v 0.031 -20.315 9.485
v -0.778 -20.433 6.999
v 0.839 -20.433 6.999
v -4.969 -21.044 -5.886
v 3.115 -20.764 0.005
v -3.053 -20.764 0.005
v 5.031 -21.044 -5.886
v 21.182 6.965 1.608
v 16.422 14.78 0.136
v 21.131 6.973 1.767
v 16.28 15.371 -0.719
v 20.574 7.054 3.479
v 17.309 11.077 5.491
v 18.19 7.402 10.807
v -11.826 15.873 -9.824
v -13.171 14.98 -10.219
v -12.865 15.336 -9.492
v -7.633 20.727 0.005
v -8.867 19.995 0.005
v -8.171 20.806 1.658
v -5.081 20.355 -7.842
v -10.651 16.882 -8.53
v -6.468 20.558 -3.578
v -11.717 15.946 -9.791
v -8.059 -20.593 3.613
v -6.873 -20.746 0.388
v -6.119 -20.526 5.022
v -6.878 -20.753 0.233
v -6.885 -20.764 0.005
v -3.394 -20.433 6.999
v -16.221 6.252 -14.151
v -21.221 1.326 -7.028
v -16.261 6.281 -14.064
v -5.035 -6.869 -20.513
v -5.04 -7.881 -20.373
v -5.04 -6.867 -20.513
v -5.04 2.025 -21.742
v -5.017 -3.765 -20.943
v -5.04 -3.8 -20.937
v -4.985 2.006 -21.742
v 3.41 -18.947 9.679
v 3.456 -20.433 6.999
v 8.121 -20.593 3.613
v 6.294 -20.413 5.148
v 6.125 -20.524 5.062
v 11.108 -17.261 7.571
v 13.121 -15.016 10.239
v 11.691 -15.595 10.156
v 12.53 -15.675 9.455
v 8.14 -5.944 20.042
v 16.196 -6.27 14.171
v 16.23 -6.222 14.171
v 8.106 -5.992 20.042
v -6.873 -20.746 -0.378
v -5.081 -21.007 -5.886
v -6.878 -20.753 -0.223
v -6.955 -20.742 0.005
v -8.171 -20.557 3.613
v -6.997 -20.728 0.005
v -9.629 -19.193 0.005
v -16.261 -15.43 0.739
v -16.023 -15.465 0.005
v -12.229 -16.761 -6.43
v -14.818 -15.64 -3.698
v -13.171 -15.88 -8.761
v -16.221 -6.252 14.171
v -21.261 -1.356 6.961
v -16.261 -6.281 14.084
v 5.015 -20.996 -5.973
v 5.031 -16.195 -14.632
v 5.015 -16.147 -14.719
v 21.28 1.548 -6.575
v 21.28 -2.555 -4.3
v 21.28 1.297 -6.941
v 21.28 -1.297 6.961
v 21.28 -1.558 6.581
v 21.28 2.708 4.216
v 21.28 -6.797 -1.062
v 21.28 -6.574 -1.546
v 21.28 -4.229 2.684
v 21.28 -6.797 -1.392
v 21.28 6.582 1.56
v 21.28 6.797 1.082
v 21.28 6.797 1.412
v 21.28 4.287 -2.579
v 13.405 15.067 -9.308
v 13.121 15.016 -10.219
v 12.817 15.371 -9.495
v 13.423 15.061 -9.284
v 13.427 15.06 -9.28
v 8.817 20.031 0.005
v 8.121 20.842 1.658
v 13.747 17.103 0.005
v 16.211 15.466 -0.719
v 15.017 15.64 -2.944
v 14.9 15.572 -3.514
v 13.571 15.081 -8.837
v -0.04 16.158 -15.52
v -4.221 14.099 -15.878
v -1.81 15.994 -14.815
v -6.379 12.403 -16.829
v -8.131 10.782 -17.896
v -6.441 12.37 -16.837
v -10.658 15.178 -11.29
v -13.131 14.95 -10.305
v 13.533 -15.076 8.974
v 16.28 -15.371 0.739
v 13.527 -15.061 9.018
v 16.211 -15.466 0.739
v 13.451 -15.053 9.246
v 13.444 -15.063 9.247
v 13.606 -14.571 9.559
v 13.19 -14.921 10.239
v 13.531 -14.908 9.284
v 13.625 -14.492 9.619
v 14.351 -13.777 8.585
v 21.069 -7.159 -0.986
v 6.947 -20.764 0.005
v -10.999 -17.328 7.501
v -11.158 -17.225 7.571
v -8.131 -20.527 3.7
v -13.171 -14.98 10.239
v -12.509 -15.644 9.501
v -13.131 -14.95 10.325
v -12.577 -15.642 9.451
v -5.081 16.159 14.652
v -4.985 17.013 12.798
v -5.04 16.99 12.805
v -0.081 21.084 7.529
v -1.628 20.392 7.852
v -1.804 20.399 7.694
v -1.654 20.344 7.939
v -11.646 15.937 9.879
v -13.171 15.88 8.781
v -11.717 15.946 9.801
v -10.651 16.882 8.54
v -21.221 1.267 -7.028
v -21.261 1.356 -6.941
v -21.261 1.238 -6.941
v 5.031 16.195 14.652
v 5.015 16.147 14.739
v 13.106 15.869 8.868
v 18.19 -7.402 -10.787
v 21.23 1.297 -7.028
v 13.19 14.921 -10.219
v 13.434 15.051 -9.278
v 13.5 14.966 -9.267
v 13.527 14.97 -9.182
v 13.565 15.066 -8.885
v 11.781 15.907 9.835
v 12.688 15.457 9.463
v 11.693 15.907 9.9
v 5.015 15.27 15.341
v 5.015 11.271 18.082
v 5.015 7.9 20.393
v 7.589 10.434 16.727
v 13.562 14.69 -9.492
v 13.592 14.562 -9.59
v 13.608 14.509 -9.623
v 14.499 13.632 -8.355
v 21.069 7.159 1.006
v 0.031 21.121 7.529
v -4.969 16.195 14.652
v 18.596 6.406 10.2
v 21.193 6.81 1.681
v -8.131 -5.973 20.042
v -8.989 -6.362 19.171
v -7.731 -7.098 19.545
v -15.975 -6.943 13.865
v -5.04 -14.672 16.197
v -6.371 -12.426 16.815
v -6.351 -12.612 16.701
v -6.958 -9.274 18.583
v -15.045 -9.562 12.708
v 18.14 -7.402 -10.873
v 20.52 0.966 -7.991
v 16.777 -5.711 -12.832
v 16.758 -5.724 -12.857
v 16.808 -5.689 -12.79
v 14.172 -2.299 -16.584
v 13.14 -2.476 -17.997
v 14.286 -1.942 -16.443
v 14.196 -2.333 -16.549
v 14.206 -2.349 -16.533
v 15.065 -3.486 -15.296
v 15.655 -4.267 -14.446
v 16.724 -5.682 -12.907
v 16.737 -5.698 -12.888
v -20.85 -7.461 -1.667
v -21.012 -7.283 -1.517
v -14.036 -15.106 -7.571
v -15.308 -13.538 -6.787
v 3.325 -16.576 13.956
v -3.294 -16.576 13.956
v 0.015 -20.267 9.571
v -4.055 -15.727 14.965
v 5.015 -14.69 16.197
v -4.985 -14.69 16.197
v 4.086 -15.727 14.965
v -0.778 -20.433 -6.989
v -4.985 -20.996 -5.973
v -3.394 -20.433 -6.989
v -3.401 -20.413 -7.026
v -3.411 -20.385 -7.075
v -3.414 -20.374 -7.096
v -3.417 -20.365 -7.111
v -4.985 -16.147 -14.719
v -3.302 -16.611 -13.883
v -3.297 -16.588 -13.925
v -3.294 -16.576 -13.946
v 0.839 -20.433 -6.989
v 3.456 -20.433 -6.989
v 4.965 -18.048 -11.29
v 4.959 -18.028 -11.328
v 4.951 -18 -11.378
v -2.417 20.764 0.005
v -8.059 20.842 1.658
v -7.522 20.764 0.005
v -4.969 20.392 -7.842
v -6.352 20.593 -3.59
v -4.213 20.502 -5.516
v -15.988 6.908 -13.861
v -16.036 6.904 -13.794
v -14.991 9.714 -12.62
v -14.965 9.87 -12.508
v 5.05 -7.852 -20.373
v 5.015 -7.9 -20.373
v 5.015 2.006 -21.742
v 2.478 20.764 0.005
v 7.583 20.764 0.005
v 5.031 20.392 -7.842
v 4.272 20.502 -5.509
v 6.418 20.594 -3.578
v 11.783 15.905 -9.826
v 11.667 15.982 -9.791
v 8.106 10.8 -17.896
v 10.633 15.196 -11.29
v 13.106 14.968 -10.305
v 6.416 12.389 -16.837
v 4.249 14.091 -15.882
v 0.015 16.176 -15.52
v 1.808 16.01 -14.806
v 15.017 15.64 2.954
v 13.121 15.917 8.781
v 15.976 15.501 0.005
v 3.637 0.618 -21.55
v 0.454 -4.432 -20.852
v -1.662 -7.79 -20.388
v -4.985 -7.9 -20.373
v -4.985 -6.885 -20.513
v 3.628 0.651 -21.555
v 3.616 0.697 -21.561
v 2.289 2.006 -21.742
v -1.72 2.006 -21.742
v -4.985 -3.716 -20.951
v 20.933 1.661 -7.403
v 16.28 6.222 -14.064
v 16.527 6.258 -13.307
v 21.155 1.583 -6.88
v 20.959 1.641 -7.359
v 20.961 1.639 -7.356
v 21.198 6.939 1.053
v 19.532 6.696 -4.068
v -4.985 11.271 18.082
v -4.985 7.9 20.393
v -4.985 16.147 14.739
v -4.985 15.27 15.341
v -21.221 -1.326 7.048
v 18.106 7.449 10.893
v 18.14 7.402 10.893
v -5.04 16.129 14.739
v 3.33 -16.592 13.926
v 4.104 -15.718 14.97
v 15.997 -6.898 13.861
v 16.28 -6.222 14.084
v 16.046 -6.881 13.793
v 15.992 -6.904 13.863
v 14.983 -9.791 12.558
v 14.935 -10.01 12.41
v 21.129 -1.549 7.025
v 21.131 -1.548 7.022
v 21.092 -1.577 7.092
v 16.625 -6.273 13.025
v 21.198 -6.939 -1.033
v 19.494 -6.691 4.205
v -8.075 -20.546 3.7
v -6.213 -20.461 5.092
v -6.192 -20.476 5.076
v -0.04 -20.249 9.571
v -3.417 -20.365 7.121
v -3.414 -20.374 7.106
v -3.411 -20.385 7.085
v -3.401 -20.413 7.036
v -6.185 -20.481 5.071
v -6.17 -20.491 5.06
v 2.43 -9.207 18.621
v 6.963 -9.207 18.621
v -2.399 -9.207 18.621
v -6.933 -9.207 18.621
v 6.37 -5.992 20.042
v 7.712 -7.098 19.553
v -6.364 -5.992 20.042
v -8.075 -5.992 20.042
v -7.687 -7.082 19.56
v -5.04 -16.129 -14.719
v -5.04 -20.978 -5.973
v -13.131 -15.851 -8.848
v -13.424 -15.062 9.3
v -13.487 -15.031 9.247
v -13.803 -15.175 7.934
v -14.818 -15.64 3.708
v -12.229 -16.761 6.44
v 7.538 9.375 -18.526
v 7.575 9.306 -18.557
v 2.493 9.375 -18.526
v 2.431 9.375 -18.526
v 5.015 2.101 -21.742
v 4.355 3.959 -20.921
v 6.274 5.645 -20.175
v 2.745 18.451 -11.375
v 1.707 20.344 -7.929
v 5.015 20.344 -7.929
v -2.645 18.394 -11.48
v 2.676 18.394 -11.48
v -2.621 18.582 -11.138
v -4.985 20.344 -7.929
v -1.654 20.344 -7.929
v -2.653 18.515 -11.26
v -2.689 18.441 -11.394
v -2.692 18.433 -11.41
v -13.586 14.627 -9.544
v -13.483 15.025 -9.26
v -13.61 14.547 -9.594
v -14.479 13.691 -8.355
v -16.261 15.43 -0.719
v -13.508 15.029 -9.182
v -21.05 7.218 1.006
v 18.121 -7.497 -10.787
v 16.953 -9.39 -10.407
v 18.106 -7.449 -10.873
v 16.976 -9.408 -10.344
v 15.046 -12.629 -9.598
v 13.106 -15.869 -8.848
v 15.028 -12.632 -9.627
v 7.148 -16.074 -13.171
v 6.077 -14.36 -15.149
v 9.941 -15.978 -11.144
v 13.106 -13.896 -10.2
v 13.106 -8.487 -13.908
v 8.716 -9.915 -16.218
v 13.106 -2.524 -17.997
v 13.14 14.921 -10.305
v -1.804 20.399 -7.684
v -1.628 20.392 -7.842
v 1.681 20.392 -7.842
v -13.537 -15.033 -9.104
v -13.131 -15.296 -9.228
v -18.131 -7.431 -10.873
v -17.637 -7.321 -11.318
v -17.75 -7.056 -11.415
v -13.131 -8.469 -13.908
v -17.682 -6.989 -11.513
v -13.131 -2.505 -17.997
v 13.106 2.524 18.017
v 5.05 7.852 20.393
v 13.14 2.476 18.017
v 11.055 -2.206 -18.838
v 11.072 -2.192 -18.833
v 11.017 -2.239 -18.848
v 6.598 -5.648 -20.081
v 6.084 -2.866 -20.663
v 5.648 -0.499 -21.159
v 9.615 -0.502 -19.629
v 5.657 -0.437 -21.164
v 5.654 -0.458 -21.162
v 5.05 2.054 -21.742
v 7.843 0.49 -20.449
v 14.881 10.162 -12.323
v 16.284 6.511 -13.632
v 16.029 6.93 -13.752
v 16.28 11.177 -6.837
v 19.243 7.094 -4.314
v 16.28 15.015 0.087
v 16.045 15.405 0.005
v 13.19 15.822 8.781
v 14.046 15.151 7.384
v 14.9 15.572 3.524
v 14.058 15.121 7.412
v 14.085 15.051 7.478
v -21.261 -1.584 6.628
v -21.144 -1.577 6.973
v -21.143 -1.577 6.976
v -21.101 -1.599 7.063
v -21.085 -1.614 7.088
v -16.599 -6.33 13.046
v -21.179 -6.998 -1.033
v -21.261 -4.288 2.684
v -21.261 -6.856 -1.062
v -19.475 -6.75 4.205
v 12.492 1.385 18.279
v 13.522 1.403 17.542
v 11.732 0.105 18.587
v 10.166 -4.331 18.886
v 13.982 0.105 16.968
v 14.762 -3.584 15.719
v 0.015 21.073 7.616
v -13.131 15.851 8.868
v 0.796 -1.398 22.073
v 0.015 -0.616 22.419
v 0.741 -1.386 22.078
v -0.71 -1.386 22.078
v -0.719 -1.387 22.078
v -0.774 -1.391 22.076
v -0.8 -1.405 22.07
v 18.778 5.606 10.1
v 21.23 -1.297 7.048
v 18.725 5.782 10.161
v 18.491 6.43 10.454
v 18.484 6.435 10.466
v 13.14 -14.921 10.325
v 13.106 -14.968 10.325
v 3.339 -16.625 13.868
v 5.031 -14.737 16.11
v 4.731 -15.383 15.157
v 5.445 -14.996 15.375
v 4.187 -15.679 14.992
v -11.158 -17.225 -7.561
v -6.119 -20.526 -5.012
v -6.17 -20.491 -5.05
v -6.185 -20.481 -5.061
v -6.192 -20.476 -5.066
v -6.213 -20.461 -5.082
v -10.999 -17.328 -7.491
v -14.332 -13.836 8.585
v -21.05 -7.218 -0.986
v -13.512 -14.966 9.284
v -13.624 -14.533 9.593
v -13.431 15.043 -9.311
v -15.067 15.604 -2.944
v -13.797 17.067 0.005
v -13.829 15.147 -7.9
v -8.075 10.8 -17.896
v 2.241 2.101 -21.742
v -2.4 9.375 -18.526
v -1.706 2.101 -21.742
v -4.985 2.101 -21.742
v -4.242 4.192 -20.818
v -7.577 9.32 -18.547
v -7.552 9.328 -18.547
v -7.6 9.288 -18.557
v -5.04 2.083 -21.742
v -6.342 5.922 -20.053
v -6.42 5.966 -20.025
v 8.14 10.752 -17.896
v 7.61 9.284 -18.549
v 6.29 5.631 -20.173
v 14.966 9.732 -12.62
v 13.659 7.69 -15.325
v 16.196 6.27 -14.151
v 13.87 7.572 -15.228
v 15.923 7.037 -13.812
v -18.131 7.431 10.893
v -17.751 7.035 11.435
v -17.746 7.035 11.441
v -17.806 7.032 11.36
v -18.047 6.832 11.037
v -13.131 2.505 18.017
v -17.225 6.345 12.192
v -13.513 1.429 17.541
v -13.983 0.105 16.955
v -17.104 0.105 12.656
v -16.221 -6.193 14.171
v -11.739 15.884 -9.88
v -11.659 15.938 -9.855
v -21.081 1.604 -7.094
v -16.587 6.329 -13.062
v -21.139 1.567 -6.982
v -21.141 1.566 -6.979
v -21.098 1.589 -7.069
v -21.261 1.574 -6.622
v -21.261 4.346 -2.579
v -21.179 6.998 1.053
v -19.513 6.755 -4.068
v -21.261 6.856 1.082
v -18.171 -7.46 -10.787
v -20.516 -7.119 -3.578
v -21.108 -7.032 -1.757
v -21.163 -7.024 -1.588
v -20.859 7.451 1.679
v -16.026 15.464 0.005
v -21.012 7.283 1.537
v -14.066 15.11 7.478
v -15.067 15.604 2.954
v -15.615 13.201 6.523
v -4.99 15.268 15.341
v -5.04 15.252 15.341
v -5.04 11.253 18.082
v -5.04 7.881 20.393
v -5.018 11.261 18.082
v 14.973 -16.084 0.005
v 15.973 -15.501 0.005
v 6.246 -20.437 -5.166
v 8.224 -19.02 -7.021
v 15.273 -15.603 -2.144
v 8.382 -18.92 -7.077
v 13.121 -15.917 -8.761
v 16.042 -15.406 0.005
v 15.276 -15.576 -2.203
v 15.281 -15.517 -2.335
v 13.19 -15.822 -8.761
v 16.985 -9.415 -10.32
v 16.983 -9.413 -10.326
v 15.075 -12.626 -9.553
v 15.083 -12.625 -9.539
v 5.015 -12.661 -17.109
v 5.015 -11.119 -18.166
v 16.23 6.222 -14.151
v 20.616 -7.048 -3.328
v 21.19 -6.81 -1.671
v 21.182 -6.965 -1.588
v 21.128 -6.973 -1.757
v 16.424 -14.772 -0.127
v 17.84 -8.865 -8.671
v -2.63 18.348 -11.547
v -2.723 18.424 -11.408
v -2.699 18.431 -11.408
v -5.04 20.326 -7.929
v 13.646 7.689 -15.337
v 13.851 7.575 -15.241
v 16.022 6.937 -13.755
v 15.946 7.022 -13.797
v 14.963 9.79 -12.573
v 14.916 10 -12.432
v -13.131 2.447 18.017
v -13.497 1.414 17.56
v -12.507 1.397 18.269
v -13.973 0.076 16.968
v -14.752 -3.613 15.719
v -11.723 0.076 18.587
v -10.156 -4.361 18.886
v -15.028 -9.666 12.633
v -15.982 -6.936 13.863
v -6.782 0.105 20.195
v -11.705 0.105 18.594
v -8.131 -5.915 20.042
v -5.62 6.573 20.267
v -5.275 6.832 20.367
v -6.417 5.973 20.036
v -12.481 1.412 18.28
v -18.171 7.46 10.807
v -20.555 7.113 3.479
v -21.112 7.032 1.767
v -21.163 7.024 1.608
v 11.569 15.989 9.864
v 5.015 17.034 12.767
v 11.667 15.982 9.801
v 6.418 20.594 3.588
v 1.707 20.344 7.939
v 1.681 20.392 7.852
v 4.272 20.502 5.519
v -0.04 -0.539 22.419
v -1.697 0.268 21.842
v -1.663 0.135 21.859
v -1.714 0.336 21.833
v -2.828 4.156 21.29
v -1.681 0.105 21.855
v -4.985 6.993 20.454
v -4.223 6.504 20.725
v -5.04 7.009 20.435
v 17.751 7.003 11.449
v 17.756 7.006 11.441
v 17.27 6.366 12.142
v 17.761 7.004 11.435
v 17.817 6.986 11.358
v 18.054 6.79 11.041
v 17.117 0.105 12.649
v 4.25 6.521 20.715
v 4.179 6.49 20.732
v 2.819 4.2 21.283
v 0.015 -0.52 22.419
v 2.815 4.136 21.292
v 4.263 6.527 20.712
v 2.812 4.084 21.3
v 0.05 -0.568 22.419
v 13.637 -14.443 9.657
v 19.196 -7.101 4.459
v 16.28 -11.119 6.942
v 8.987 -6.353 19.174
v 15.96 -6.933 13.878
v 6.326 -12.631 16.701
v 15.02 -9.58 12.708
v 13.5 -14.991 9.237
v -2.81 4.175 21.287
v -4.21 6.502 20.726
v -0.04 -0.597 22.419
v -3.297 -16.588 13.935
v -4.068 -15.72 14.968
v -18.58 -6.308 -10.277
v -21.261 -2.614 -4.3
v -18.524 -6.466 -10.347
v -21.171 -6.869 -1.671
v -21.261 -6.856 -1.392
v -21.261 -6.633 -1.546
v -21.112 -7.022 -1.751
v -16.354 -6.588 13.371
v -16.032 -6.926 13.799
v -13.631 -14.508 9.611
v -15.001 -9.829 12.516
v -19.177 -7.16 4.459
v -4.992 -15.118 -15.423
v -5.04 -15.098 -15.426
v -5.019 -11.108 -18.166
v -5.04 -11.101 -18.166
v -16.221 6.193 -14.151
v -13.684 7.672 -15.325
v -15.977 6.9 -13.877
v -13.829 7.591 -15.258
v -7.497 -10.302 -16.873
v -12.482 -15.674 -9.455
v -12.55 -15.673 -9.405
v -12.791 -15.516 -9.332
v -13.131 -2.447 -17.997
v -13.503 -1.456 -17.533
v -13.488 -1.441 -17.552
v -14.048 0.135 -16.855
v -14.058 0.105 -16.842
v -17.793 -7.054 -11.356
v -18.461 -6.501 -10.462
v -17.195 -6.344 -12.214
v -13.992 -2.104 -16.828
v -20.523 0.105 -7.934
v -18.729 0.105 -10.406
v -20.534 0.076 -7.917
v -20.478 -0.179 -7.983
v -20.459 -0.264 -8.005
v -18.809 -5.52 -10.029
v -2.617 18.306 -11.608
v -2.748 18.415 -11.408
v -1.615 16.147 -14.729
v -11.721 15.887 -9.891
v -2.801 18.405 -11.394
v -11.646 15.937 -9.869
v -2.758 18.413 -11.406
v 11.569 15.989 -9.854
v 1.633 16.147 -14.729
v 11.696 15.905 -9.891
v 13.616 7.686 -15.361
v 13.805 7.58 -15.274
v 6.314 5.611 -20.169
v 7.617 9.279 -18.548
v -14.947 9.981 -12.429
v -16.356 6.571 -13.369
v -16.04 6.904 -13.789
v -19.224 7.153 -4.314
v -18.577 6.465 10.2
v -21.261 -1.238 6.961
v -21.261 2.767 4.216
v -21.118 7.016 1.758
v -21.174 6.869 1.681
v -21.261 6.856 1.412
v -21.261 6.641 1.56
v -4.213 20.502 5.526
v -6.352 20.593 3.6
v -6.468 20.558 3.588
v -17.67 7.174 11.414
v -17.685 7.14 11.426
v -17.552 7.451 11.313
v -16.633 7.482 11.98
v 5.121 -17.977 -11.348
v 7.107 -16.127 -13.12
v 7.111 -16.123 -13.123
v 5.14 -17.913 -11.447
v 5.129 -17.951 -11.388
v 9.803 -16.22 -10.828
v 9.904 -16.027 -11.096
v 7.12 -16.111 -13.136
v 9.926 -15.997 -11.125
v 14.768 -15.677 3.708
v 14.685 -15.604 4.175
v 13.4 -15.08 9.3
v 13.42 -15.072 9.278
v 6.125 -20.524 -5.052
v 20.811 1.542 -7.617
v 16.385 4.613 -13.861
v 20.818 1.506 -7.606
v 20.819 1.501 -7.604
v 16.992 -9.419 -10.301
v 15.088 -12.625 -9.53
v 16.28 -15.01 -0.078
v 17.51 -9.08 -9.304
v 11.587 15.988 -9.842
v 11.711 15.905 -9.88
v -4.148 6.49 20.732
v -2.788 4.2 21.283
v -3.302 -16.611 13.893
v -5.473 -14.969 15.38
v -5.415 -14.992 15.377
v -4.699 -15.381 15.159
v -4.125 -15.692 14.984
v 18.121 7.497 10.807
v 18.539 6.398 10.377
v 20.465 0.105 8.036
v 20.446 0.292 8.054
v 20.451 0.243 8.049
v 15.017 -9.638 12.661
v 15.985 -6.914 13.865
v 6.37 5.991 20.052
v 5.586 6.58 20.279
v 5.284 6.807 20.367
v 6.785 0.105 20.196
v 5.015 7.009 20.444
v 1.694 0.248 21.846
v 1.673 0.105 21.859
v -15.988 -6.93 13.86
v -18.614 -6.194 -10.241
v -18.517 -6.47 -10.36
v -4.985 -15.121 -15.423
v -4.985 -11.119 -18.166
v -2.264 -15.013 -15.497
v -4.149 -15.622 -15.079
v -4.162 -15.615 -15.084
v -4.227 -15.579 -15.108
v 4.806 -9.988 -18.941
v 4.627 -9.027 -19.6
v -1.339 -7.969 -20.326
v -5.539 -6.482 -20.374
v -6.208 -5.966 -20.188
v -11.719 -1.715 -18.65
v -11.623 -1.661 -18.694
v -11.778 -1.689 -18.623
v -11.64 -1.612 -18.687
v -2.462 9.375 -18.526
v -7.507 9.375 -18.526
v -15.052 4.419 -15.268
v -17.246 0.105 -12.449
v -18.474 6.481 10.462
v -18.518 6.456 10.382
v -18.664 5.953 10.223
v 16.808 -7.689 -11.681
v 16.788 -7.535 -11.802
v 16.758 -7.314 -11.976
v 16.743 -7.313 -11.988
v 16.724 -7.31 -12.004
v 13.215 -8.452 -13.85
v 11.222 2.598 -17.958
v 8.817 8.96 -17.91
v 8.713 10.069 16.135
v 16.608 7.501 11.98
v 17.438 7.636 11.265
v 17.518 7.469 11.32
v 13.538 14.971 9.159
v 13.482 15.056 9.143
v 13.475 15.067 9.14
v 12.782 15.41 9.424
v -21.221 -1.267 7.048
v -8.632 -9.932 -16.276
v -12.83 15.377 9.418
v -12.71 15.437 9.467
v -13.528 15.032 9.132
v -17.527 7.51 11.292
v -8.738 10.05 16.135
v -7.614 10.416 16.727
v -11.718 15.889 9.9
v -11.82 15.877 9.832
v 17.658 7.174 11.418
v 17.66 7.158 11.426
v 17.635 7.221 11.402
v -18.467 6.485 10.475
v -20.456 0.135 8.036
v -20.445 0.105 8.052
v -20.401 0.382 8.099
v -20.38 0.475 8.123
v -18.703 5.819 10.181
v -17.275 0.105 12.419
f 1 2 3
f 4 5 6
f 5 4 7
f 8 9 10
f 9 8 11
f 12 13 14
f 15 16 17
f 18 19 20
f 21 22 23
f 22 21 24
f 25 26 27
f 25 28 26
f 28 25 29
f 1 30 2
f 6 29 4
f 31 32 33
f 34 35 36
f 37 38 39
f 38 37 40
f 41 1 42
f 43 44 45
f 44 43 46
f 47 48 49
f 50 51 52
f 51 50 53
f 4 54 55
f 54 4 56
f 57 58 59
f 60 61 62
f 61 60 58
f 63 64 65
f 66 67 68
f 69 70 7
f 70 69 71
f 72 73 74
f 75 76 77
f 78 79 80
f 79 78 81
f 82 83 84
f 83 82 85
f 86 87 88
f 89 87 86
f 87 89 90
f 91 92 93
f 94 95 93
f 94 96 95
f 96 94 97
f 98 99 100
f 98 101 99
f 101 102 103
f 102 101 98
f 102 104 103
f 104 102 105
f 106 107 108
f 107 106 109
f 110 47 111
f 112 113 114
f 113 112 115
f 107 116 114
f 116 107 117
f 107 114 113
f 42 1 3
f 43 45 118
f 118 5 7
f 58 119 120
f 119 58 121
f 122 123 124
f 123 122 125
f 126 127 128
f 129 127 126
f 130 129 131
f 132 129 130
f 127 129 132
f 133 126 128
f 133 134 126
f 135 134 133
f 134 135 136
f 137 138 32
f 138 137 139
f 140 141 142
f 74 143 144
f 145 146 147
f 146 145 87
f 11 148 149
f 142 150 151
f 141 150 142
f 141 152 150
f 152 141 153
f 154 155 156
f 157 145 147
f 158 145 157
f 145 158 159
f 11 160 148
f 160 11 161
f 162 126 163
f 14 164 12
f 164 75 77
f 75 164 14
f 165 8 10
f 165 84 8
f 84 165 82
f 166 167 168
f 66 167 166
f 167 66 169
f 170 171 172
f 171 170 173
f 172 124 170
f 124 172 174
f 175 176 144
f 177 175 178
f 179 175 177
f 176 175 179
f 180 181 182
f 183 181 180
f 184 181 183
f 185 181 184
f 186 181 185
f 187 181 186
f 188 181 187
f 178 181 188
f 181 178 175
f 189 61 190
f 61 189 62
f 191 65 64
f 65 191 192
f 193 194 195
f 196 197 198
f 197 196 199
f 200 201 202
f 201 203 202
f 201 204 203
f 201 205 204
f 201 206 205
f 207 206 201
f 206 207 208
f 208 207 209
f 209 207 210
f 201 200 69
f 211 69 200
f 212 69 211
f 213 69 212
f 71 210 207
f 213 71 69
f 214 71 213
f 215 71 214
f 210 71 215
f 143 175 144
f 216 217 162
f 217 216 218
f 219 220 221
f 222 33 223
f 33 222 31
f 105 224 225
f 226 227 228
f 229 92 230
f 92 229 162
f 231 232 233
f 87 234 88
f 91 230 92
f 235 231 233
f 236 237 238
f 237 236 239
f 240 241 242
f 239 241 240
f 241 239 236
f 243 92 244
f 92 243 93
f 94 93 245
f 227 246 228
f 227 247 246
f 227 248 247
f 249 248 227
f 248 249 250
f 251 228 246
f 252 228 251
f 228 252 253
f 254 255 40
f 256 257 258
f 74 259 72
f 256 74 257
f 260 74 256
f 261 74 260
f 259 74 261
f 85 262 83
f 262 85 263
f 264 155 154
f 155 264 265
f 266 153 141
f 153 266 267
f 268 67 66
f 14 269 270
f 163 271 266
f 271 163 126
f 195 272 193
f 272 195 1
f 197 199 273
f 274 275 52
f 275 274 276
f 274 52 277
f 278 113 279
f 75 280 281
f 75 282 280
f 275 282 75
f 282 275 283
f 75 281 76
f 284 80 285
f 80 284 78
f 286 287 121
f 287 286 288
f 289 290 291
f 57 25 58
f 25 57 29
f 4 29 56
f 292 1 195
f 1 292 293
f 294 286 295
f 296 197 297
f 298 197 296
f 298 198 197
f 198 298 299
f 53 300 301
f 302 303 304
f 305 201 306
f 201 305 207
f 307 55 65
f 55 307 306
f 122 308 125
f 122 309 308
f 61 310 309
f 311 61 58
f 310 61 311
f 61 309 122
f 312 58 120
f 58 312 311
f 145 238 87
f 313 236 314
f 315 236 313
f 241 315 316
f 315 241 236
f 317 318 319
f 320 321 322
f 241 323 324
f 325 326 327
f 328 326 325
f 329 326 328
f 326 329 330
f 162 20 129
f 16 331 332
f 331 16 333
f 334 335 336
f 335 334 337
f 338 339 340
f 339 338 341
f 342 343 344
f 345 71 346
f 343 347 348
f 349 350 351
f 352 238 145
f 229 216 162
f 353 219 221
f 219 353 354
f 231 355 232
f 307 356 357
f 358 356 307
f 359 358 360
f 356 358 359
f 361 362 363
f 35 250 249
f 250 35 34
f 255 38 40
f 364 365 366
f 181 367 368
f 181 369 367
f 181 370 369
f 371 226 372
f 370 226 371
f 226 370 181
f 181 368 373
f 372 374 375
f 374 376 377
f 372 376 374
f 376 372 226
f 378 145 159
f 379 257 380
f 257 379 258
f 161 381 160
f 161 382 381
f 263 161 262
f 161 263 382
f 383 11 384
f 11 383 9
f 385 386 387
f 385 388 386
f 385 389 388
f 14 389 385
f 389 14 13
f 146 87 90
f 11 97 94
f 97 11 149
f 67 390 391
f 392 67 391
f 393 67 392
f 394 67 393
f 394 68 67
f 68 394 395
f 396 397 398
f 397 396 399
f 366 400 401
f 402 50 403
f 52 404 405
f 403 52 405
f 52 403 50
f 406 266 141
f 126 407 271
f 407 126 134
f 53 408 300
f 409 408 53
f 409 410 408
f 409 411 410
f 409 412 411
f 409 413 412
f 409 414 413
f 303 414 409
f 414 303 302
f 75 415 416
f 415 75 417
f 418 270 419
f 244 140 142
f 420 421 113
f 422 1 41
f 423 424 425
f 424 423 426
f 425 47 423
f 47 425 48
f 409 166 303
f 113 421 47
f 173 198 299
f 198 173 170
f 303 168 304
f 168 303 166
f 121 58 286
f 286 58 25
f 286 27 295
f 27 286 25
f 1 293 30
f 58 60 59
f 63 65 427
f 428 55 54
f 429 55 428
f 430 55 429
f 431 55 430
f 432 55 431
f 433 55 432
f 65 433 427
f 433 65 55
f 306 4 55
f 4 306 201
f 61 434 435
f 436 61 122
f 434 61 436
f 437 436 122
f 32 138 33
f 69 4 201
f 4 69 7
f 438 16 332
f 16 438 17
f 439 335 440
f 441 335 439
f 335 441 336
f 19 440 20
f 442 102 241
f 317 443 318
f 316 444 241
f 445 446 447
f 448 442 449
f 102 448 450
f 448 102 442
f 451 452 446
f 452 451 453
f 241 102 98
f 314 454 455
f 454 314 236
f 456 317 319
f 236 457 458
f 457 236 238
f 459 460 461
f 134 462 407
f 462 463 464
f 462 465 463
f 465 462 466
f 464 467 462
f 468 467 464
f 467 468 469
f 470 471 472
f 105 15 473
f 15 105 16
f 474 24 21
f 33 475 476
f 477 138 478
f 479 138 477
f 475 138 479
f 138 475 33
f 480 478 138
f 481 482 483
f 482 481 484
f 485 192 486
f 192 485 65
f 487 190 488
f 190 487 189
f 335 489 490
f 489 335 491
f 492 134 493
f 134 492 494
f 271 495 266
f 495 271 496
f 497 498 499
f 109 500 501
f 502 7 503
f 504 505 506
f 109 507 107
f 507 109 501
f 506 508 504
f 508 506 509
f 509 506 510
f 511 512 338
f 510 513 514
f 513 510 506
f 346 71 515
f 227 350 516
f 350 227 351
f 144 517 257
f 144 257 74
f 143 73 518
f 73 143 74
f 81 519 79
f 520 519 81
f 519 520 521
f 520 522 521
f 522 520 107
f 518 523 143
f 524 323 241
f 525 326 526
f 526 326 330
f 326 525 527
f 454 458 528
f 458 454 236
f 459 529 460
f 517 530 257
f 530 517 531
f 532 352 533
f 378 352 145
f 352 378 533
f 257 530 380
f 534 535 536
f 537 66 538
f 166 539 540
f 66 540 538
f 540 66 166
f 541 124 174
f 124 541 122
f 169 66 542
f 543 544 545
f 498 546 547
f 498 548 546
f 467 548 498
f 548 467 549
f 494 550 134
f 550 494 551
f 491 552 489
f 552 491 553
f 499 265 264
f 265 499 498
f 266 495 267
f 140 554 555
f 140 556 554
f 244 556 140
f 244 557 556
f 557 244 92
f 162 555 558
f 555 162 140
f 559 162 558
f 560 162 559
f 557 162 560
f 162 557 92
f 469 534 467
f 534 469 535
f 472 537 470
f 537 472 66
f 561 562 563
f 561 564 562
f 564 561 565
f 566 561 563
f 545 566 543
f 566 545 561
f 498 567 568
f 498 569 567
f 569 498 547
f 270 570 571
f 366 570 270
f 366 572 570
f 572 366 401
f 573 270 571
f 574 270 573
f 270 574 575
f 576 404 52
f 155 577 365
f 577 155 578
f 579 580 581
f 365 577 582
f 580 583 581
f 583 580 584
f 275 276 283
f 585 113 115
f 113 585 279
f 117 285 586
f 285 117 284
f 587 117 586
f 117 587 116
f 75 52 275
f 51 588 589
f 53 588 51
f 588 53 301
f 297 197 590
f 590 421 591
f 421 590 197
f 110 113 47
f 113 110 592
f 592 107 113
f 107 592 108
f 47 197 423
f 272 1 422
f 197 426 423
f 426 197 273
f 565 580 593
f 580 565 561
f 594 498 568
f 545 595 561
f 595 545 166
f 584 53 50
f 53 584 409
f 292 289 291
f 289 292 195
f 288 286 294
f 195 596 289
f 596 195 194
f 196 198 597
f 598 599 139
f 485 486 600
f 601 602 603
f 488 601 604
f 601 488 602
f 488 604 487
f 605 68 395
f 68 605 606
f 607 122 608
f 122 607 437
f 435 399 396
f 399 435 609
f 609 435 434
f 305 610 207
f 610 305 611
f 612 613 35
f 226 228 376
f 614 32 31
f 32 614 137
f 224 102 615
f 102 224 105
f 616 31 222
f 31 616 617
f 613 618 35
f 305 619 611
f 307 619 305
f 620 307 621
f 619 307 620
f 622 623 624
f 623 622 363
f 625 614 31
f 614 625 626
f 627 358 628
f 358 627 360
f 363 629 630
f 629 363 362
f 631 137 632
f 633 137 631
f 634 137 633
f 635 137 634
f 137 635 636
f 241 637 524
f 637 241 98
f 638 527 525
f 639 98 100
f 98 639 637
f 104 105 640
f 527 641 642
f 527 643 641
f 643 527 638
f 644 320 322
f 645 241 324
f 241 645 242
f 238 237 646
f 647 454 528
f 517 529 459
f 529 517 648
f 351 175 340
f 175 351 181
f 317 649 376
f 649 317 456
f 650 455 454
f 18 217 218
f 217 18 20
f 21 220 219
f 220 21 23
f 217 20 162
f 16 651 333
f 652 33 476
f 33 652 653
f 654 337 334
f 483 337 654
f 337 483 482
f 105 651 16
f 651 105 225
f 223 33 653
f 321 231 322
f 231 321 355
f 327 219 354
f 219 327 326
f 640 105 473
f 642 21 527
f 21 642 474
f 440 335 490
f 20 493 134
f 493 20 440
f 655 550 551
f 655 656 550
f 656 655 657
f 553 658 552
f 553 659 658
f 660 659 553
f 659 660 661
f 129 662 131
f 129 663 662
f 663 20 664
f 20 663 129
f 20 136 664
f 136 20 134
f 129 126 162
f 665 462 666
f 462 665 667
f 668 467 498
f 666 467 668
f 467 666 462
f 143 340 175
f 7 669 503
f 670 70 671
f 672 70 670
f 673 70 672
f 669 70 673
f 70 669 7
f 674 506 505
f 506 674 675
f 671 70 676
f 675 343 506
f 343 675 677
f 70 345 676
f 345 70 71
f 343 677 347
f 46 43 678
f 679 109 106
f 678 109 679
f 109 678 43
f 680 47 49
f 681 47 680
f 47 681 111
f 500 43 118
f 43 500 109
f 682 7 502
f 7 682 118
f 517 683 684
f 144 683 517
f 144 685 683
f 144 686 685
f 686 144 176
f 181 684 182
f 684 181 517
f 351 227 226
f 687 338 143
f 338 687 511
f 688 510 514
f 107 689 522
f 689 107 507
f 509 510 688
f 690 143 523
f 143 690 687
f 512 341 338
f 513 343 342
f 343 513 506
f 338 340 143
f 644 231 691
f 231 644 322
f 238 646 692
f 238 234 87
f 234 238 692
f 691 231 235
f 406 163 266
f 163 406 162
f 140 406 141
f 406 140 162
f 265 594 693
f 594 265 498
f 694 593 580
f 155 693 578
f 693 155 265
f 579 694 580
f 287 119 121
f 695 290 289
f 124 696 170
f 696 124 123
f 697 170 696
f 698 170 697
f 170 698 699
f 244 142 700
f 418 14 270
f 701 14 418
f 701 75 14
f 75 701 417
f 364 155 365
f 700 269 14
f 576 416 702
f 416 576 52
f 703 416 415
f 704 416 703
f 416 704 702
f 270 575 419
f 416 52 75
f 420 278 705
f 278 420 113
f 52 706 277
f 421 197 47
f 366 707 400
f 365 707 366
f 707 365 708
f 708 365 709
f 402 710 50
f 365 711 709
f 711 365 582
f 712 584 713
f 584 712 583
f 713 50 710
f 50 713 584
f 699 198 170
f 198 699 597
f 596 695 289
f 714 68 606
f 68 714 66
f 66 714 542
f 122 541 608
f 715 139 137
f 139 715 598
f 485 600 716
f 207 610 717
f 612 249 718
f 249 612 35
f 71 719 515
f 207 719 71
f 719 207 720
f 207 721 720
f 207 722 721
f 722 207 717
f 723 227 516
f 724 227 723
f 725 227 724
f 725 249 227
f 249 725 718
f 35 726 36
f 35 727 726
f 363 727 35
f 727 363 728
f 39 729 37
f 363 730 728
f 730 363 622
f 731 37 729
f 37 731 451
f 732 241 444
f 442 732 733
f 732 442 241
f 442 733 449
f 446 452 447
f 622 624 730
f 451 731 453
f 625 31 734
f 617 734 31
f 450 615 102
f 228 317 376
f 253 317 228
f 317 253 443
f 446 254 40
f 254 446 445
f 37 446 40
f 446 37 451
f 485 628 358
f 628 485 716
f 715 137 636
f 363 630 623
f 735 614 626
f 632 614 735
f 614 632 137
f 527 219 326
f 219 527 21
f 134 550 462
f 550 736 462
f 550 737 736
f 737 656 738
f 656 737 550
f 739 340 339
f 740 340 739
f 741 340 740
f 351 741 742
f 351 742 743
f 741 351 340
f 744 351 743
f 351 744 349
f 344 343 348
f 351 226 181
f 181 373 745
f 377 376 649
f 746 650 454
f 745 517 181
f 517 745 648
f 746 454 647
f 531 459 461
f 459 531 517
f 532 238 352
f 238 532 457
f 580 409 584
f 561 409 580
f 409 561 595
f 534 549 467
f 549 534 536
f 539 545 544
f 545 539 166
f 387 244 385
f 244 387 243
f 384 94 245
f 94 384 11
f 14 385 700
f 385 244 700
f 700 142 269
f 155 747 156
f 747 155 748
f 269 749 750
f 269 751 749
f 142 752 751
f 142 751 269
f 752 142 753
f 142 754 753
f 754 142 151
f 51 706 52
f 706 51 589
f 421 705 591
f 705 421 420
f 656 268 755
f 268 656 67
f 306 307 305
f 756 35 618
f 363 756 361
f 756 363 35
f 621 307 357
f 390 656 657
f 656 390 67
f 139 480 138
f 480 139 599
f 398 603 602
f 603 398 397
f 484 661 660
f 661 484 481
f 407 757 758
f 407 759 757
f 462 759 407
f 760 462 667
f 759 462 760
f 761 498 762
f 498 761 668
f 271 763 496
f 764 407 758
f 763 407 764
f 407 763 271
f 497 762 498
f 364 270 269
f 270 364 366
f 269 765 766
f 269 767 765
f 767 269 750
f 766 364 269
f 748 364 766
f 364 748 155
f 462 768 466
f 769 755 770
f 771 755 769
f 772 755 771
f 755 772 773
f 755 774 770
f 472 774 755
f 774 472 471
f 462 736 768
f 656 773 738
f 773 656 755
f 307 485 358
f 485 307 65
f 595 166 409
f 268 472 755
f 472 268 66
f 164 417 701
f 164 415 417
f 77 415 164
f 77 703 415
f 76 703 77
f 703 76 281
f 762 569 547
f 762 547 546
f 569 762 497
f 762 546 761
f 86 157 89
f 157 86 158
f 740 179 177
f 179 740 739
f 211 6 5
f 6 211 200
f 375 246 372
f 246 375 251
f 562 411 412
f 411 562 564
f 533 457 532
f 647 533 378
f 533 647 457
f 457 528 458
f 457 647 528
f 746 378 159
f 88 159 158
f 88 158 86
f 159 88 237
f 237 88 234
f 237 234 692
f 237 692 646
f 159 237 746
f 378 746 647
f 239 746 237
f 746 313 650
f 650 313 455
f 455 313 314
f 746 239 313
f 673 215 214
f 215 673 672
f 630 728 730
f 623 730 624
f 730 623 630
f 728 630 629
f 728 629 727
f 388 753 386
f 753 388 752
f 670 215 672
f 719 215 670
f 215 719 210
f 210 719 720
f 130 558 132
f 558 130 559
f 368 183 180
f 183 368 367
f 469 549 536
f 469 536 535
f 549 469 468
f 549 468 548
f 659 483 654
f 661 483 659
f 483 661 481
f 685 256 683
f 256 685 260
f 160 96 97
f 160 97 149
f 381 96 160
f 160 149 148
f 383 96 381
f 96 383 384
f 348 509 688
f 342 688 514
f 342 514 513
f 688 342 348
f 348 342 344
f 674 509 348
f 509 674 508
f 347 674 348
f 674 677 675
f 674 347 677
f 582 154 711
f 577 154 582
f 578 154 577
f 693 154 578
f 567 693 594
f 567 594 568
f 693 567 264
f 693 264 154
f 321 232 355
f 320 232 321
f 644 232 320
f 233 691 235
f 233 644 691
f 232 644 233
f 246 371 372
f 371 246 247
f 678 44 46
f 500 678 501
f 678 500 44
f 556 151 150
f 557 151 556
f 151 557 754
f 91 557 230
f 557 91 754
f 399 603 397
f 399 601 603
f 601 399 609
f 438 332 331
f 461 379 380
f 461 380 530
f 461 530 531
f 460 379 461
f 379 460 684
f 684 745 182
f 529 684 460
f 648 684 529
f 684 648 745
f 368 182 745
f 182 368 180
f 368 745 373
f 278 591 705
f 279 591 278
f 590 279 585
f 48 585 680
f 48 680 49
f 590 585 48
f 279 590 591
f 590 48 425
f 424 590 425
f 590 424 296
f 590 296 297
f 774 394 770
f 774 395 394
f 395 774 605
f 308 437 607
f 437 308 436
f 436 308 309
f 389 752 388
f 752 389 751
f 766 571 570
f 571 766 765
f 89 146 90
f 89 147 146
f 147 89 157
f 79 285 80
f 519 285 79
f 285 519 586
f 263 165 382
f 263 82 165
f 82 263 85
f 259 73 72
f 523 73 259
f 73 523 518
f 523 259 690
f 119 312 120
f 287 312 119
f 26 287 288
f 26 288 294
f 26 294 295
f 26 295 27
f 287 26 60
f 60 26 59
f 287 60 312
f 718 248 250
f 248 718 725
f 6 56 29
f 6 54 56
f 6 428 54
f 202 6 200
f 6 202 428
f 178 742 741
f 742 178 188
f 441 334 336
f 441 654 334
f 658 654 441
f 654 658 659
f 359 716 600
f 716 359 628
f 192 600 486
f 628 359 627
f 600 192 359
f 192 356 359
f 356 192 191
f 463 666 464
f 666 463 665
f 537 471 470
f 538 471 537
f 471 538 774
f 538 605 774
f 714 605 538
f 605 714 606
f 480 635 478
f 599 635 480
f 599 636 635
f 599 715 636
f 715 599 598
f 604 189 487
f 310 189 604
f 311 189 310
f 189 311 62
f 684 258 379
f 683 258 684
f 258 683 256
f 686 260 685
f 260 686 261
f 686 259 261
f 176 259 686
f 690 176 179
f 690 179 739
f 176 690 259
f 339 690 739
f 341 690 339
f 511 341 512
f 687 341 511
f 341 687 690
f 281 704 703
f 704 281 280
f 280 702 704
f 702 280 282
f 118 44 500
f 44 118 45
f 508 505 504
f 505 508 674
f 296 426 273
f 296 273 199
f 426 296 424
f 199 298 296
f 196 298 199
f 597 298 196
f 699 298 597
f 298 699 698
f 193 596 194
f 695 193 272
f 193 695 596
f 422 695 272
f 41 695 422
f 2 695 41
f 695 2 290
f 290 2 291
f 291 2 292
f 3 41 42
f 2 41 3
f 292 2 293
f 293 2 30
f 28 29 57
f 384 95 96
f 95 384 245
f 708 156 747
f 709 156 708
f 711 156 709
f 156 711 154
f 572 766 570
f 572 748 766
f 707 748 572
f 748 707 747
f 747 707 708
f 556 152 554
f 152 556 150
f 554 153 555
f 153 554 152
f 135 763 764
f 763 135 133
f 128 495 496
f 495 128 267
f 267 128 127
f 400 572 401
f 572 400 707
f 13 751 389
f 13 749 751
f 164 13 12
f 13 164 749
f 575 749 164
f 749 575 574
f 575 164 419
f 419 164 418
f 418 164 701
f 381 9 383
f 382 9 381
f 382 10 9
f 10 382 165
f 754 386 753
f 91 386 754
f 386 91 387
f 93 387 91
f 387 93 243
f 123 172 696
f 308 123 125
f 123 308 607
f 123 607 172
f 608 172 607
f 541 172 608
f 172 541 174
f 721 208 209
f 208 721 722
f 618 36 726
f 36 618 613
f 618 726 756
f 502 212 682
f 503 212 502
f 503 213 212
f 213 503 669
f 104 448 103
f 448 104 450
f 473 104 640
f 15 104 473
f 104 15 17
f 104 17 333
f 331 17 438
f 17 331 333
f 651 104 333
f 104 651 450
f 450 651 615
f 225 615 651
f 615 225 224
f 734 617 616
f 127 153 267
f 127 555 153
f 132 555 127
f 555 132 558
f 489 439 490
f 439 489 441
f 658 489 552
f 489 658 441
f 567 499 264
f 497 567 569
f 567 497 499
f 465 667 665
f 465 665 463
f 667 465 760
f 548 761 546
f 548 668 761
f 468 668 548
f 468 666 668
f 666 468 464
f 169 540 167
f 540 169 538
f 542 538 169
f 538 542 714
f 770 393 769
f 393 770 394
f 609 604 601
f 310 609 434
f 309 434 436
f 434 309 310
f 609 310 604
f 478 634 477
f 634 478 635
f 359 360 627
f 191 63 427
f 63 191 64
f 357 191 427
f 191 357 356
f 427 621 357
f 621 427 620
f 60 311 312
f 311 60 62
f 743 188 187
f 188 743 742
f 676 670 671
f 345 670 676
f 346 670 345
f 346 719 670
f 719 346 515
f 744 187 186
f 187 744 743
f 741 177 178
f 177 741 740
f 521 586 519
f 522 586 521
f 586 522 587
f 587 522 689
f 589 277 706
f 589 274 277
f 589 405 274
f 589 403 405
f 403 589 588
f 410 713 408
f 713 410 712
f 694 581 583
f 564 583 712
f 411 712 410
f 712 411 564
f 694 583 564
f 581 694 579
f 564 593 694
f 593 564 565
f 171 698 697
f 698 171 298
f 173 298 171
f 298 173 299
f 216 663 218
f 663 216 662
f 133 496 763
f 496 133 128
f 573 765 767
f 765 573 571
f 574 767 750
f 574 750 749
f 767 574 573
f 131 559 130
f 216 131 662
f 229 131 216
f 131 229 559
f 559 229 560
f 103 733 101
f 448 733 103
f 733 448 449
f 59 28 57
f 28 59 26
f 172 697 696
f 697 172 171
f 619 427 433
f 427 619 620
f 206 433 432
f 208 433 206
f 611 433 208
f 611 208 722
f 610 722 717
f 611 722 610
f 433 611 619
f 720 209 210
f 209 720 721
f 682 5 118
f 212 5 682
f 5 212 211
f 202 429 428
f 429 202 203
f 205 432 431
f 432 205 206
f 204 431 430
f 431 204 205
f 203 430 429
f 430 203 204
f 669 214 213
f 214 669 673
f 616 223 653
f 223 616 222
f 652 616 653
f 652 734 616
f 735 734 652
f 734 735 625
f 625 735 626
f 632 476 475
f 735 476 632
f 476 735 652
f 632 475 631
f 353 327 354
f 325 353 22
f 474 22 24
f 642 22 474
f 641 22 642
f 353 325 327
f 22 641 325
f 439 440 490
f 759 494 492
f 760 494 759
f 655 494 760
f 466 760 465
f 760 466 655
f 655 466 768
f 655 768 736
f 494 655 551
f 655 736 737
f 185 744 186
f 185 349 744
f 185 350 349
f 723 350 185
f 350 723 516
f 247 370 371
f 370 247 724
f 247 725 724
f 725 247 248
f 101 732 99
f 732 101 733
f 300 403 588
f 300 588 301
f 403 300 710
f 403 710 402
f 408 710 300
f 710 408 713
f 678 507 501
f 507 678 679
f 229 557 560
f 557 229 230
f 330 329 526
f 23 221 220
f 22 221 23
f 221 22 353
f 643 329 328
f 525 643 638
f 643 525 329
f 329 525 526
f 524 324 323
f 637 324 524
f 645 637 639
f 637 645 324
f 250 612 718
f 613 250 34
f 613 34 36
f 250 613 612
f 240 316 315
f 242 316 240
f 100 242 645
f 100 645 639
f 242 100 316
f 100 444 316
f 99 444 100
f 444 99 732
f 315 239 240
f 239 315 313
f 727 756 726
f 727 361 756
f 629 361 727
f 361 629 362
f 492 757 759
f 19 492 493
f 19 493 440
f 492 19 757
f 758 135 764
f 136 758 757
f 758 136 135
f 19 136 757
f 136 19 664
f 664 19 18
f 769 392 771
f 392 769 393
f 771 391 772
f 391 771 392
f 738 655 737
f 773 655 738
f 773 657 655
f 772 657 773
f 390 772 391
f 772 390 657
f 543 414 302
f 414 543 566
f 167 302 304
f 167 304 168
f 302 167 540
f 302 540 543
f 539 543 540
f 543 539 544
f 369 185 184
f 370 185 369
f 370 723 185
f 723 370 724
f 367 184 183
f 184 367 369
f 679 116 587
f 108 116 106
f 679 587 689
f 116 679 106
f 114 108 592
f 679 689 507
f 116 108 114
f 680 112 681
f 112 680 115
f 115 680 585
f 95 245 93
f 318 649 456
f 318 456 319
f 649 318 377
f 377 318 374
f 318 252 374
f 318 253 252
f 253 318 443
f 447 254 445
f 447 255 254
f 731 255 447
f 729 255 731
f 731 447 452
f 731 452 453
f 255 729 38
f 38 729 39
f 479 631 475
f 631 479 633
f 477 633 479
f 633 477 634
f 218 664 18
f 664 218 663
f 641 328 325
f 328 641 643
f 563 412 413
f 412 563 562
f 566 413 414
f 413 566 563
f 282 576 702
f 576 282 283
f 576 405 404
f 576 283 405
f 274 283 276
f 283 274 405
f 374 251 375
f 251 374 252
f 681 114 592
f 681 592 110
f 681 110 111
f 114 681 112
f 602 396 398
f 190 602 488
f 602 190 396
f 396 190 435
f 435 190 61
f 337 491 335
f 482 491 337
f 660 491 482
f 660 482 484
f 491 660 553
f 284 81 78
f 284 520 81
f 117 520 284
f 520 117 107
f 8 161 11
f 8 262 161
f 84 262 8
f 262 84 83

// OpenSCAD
// Auto-generated OpenSCAD file
    shift = 0.01;

    inner_points = 10*[[0.5000000000001233, 1.6099947582269307, -1.4642352461204697], [-1.6180339887500594, -0.7526043623065494, 1.3422446358941107], [0.8090169943752056, 0.7804419520270026, -1.929370322107236], [-1.3090169943749772, -1.5821571685064775, 0.8771095599073444], [1.3090169943749772, 1.5821571685064775, -0.8771095599073444], [-0.8090169943752056, -0.7804419520270026, 1.929370322107236], [1.6180339887500594, 0.7526043623065494, -1.3422446358941107], [-0.5000000000001233, -1.6099947582269307, 1.4642352461204697], [-1.6180339887497301, 0.752604362306319, -1.342244635894637], [-2.118033988749798, 0.1948703662791984, -0.6797246062536065], [-1.309016994374648, -0.07694844389360919, -1.8073797118814032], [-1.8090169943747159, -0.6346824399207297, -1.144859682240373], [1.8090169943747159, 0.6346824399207297, 1.144859682240373], [1.309016994374648, 0.07694844389360919, 1.8073797118814032], [2.118033988749798, -0.1948703662791984, 0.6797246062536065], [1.6180339887497301, -0.752604362306319, 1.342244635894637], [-2.7630675525358583e-14, 2.1025431187665826, -0.7519178221235898], [-1.30901699437522, 1.4920728358409685, 1.0228690720136886], [0.8618033988753376, -0.21095885990434457, -2.0491118170111076], [2.9809488211185453e-13, -2.021969242147636, -0.9474747285857835], [0.8090169943748263, 2.0747055290461294, -0.1647921359104645], [-0.500000000000366, 1.4642352461205153, 1.609994758226814], [1.6708203932501915, -0.2387964496247978, -1.4619861307979825], [0.8090169943751521, -2.0498068318680893, -0.3603490423726582], [-0.5000000000002721, 2.0296633627133747, 0.7851971800500518], [-1.309016994375247, 0.07694844389342262, 1.8073797118809776], [0.8618033988753109, -1.6260832518518904, -1.264601177143819], [-0.49999999999994665, -2.094848998200844, 0.5896402735878584], [-0.8090169943746892, 0.7804419520268874, -1.9293703221074994], [-2.118033988749815, -0.6797246062534129, -0.19487036627969367], [2.118033988749815, 0.6797246062534129, 0.19487036627969367], [0.8090169943746892, -0.7804419520268874, 1.9293703221074994], [-1.6180339887500161, 1.5371150021736077, 0.07287975605290908], [-0.49999999999963374, -1.4642352461205865, -1.6099947582269767], [0.49999999999963374, 1.4642352461205865, 1.6099947582269767], [1.6180339887500161, -1.5371150021736077, -0.07287975605290908], [-0.49999999999987643, 1.6099947582268597, -1.4642352461206323], [-2.1180339887499917, -0.19487036627950022, 0.6797246062529179], [3.4166940110491595e-13, 0.26775012233252143, -2.2168396084269855], [-1.6180339887497732, -1.5371150021738385, -0.07287975605343533], [1.6180339887497732, 1.5371150021738385, 0.07287975605343533], [-3.4166940110491595e-13, -0.26775012233252143, 2.2168396084269855], [2.1180339887499917, 0.19487036627950022, -0.6797246062529179], [0.49999999999987643, -1.6099947582268597, 1.4642352461206323], [-1.3090169943749175, 1.5821571685062912, -0.8771095599077703], [-2.118033988749975, 0.6797246062531112, 0.1948703662790049], [-0.4999999999996173, -0.5896402735879751, -2.0948489982008898], [-1.3090169943746748, -1.4920728358411552, -1.0228690720141145], [1.3090169943746748, 1.4920728358411552, 1.0228690720141145], [0.4999999999996173, 0.5896402735879751, 2.0948489982008898], [2.118033988749975, -0.6797246062531112, -0.1948703662790049], [1.3090169943749175, -1.5821571685062912, 0.8771095599077703], [-0.8090169943750684, 2.074705529046014, -0.1647921359107279], [-1.8090169943751788, 0.634682439920472, 1.1448596822397847], [0.36180339887537877, -1.068349255824841, -1.9271212067850119], [-0.8090169943747427, -2.0498068318682043, -0.3603490423729214], [0.4999999999997277, 2.029663362713446, 0.7851971800502144], [-0.5000000000003827, 0.5896402735879039, 2.0948489982007272], [1.6708203932501748, -1.1133914221574093, -0.9771318908240696], [0.5000000000000535, -2.0948489982007725, 0.589640273588021]];

    outer_points_unshifted = 10*[[-0.5000000000005009, -0.7851971800501374, -2.0296633627132854], [-0.4999999999996386, 1.6099947582268983, 1.4642352461206711], [-0.5000000000003614, -1.6099947582268983, -1.4642352461204242], [-0.4999999999994991, 0.7851971800501374, 2.0296633627135323], [0.4999999999994991, -0.7851971800501374, -2.0296633627135323], [0.5000000000003614, 1.6099947582268983, 1.4642352461204242], [0.4999999999996386, -1.6099947582268983, -1.4642352461206711], [0.5000000000005009, 0.7851971800501374, 2.0296633627132854], [-2.1180339887500663, 0.12968473079194998, -0.6951128473842882], [-2.118033988749863, 0.6951128473848109, 0.1296847307924727], [-2.118033988749927, -0.6951128473848109, -0.12968473079142726], [-2.1180339887497235, -0.12968473079194998, 0.6951128473853336], [2.1180339887497235, 0.12968473079194998, -0.6951128473853336], [2.118033988749927, 0.6951128473848109, 0.12968473079142726], [2.118033988749863, -0.6951128473848109, -0.1296847307924727], [2.1180339887500663, -0.12968473079194998, 0.6951128473842882], [-0.5000000000005347, 0.2053913419602993, -2.166536954253724], [-0.5000000000001937, 2.029663362713409, -0.785197180050014], [-0.5000000000001456, -2.0948489982008094, -0.5896402735878118], [-0.49999999999960265, -1.4642352461205477, 1.6099947582270218], [0.4999999999994653, 0.2053913419602993, -2.1665369542539707], [0.4999999999998062, 2.029663362713409, -0.7851971800502607], [0.4999999999998545, -2.0948489982008094, -0.5896402735880585], [0.5000000000003973, -1.4642352461205477, 1.6099947582267748], [-3.811205046546957e-13, 1.612821613342072, -1.5443038629222117], [1.8556665349805936e-13, 2.102543118766584, 0.7519178221235856], [2.338283645958706e-13, -2.021969242147634, 0.9474747285857879], [5.50894046796066e-13, -0.05680497473877466, 2.2322278495585337], [-1.809016994375214, -0.7401550137174742, -1.0796740467522328], [-1.809016994374681, 0.7401550137174742, 1.0796740467531258], [1.809016994374681, -0.7401550137174742, -1.0796740467531258], [1.809016994375214, 0.7401550137174742, 1.0796740467522328], [-1.3090169943752, 1.4920728358410598, -1.0228690720135816], [-1.309016994374695, -1.4920728358410598, 1.0228690720142277], [1.309016994374695, 1.4920728358410598, -1.0228690720142277], [1.3090169943752, -1.4920728358410598, 1.0228690720135816], [-1.3090169943753898, -0.24760665317778863, -1.7919914707493183], [-1.309016994374731, 1.5821571685063862, 0.8771095599078771], [-1.309016994375164, -1.5821571685063862, -0.8771095599072309], [-1.3090169943745051, 0.24760665317778863, 1.7919914707499645], [1.3090169943745051, -0.24760665317778863, -1.7919914707499645], [1.309016994375164, 1.5821571685063862, 0.8771095599072309], [1.309016994374731, -1.5821571685063862, -0.8771095599078771], [1.3090169943753898, 0.24760665317778863, 1.7919914707493183], [-1.6180339887502422, 0.6222330913316356, -1.4074302713813738], [-1.6180339887499129, 1.537115002173723, -0.072879756052776], [-1.618033988749877, -1.537115002173723, 0.07287975605357463], [-1.6180339887495476, -0.6222330913316356, 1.4074302713821722], [1.6180339887495476, 0.6222330913316356, -1.4074302713821722], [1.618033988749877, 1.537115002173723, -0.07287975605357463], [1.6180339887499129, -1.537115002173723, 0.072879756052776], [1.6180339887502422, -0.6222330913316356, 1.4074302713813738], [-0.8090169943753872, 1.0752310864697234, -1.7819757548857793], [-0.8090169943749068, 2.0747055290460716, 0.16479213591079148], [-0.8090169943748585, -2.049806831868146, 0.36034904237299387], [-0.8090169943744552, -0.5943955016111235, 1.9945559575949663], [0.8090169943745077, 1.0752310864697234, -1.7819757548861785], [0.8090169943749881, 2.0747055290460716, 0.16479213591039218], [0.8090169943750364, -2.049806831868146, 0.3603490423725945], [0.8090169943754397, -0.5943955016111235, 1.994555957594567]];
    
    outer_points = [for (p = outer_points_unshifted) [p[0], p[1], p[2] + shift]];

    // Convex hull for inner set (I)
    module inner_hull() {
        hull() {
            for (p = inner_points) {
                translate(p) sphere(r=0.1);
            }
        }
    }

    // Convex hull for outer set (O) minus inner hull (O \ I)
    module outer_minus_inner() {
        difference() {
            hull() {
                for (p = outer_points) {
                    translate(p) sphere(r=0.1);
                }
            }
            inner_hull(); // Subtract inner hull
        }
    }

    // Convex hull for outer set (O) minus all translated inner hulls
    module outer_minus_AllTranslationInner() {
        difference() {
            hull() {
                for (p = outer_points) {
                    translate(p) sphere(r=0.1);
                }
            }
            hull() {
                translate([0,0,50]) inner_hull();
                translate([0,0,-50]) inner_hull();
            }; // Subtract translated inner hulls
        }
    }

    // Difference between outer_minus_inner and outer_minus_AllTranslationInner
    module outer_minus_inner_diff() {
        difference() {
            // Outer minus inner
            difference() {
                hull() {
                    for (p = outer_points) {
                        translate(p) sphere(r=0.1);
                    }
                }
                inner_hull();
            }

            // Subtract Outer minus AllTranslationInner
            difference() {
                hull() {
                    for (p = outer_points) {
                        translate(p) sphere(r=0.1);
                    }
                }
                hull() {
                    translate([0,0,50]) inner_hull();
                    translate([0,0,-50]) inner_hull();
                };
            }
        }
    }

    // Rendering all with colors applied
    // color([1, 0, 0, 0.5]) inner_hull(); // Transparent red
    // color([0, 1, 0, 1]) outer_minus_AllTranslationInner(); // Opaque green
    color([1, 1, 0, 1]) outer_minus_inner_diff(); // Opaque yellow
    
